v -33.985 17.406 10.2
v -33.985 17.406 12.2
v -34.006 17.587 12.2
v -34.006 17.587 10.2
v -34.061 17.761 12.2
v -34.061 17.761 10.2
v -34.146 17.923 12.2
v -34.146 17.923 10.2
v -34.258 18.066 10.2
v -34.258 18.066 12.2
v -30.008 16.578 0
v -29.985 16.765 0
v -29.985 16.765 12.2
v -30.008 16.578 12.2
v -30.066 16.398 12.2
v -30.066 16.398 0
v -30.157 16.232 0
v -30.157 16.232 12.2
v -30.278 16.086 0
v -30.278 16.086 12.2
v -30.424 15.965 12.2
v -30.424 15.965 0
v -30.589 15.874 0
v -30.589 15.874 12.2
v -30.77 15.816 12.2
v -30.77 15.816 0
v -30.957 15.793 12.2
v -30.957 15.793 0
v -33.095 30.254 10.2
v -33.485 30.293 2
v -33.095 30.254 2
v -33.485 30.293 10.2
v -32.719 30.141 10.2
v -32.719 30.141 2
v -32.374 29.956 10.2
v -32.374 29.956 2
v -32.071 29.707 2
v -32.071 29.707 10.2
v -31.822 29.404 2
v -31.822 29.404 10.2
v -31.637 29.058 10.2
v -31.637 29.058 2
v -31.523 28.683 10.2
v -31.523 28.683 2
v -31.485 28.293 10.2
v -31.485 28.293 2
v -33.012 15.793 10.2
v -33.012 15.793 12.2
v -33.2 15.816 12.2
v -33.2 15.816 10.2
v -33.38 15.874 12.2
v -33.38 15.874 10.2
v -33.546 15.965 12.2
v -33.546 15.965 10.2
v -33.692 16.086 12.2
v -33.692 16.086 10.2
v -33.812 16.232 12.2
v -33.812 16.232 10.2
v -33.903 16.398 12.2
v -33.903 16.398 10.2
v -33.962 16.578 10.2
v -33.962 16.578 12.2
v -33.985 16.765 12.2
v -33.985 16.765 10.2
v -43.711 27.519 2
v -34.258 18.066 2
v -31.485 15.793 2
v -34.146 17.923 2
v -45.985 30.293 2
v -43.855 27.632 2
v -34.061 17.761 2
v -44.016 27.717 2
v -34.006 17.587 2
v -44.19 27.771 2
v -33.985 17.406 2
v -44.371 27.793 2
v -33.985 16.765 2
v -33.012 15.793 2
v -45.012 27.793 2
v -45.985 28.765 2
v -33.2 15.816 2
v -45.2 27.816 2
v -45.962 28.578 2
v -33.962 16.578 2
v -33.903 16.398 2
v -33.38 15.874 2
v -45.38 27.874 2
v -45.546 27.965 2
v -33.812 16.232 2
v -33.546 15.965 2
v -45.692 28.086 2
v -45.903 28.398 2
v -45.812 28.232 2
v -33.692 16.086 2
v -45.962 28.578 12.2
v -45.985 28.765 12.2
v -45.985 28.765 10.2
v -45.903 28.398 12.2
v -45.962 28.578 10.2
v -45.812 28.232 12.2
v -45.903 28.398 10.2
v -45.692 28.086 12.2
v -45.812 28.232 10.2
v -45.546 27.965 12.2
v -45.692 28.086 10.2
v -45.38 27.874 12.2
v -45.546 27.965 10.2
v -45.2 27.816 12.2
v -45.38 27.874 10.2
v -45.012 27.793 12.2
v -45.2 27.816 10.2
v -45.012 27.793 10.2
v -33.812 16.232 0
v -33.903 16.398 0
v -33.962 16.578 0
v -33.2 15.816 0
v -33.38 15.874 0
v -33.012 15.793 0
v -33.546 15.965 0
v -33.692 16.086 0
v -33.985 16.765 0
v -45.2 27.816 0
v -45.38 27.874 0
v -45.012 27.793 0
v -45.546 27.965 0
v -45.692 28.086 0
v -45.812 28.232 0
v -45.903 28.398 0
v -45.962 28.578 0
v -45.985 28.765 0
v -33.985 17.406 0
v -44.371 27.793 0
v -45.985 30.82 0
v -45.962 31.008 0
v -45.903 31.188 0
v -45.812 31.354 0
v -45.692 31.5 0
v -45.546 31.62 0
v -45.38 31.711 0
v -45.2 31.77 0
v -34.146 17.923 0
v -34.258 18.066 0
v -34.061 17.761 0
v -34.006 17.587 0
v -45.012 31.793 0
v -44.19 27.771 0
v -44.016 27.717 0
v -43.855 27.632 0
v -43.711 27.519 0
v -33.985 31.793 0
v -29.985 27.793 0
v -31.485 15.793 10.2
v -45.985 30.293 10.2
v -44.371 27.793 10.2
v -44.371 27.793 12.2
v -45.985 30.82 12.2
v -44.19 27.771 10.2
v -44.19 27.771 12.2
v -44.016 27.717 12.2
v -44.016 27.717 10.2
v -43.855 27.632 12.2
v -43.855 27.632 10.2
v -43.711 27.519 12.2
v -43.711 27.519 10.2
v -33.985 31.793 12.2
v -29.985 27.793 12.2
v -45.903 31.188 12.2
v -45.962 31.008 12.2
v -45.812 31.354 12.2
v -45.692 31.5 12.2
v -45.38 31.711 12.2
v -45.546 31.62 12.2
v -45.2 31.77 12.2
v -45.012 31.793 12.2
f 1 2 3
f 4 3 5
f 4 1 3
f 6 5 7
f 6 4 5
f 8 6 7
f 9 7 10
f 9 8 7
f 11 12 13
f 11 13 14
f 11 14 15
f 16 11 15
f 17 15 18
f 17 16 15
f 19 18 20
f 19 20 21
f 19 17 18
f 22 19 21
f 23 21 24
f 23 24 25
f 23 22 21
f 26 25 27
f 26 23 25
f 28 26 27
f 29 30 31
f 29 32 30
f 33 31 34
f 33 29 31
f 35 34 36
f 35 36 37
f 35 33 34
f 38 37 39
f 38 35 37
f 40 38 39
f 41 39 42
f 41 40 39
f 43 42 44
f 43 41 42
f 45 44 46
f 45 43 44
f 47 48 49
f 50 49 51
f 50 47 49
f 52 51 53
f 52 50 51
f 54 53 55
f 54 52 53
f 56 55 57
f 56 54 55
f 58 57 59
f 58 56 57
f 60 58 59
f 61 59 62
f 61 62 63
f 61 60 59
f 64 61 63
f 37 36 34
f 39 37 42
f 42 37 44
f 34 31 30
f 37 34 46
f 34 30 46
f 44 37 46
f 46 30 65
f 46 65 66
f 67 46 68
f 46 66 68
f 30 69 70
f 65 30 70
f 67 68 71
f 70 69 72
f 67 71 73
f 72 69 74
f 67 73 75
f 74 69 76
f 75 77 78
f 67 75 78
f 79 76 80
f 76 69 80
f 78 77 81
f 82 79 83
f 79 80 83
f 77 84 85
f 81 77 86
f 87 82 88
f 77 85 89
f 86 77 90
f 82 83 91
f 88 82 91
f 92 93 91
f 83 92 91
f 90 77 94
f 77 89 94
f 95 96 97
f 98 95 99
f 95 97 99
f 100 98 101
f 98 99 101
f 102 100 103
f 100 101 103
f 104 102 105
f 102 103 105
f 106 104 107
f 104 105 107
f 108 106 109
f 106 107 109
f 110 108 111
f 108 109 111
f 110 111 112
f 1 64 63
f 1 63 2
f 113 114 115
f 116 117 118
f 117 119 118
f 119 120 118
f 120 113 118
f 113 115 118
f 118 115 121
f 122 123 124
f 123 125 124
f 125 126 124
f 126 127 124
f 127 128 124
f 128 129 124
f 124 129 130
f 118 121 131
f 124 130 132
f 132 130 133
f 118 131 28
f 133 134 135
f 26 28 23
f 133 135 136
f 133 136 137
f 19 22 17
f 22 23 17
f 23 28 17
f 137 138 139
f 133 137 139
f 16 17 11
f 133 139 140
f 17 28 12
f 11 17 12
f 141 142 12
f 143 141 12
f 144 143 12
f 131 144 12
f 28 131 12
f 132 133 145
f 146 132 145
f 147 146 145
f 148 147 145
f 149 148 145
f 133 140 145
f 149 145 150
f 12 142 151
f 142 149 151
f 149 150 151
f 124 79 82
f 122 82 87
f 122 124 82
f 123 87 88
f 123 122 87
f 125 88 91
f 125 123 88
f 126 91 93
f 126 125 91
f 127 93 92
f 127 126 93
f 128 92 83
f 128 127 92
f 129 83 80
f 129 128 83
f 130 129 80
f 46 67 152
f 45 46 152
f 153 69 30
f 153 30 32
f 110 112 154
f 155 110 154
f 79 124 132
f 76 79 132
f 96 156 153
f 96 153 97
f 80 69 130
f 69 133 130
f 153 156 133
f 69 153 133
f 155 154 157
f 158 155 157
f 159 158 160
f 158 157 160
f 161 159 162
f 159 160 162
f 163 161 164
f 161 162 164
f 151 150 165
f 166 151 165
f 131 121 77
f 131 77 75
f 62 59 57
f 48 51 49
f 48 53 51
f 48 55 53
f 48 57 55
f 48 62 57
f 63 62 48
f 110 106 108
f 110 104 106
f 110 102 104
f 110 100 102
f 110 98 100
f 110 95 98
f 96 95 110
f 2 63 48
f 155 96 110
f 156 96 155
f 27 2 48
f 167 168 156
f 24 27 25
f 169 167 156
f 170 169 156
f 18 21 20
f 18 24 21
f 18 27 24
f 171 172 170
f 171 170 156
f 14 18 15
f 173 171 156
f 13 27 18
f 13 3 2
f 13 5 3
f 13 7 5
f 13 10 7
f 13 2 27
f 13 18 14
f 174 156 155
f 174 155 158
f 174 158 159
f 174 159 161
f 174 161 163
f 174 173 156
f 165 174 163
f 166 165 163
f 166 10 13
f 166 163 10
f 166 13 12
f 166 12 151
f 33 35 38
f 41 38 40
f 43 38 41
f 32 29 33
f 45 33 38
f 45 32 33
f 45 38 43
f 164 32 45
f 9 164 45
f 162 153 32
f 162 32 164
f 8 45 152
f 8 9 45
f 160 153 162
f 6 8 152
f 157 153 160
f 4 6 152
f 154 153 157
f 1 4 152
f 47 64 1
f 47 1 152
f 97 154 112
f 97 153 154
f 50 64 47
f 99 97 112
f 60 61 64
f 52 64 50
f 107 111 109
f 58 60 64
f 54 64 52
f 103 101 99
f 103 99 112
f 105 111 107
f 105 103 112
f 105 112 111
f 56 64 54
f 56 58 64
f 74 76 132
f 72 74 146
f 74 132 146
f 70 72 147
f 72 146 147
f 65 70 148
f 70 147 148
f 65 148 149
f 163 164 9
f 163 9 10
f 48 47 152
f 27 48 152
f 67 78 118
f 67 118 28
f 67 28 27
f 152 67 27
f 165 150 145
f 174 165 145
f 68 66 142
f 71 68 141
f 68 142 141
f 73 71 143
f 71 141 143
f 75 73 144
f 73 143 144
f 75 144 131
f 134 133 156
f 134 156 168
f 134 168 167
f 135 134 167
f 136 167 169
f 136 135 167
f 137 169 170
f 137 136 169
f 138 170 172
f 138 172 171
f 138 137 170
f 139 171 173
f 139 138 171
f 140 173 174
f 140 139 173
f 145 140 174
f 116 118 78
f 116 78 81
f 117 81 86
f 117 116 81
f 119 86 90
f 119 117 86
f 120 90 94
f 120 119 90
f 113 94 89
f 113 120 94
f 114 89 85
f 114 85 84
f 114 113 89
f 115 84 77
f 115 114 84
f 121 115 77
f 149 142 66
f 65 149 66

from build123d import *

# Parameters (mm, degrees)
F0_W        = 4
F0_H        = 12
F1_DEPTH    = 12.2
F2_W        = 2.5
F2_H        = 8.2
F3_DEPTH    = 14.5
F4_W        = 2.5
F4_H        = 8.2
F5_DEPTH    = 13.2
F6_SIZE     = 10
F7_R        = 2
F8_SIZE     = 4
F9_T1_DEPTH = 2
F9_T3_DEPTH = 2
F9_T5_DEPTH = 7.0048288267
F9_T7_DEPTH = 17.2048288267
F9_T9_DEPTH = 7.0048288267


# Not quite as in the source:
# - a fillet or chamfer that OpenCascade refuses, or shapes differently, is made with other operations: its cross-section is extruded or revolved along the edge and cut away or added


with BuildPart() as f1:
    # F0 (on Top) → F1 (new body)
    with BuildSketch(Plane.XY):
        Polygon((-29.984754981, 31.7928069385), (-45.984754981, 31.7928069385), (-45.984754981, 27.7928069385), (-33.984754981, 27.7928069385), (-29.984754981, 27.7928069385), align=None)
        with Locations((-31.984754981, 21.7928069385)):
            Rectangle(F0_W, F0_H)
    extrude(amount=F1_DEPTH)

    # F2 (on face) → F3 (cut)
    with BuildSketch(Plane(origin=(-45.984754981, 0, 0), x_dir=(0, -1, 0), z_dir=(-1, 0, 0))):
        with Locations((-29.0428069385, 6.1)):
            Rectangle(F2_W, F2_H)
    extrude(amount=-F3_DEPTH, mode=Mode.SUBTRACT)

    # F4 (on face) → F5 (cut)
    with BuildSketch(Plane.XZ.offset(-15.7928069385)):
        with Locations((-32.734754981, 6.1)):
            Rectangle(F4_W, F4_H)
    extrude(amount=-F5_DEPTH, mode=Mode.SUBTRACT)

    # F6
    f6_edges = [f1.edges().sort_by_distance(p)[0] for p in [
        (-33.984755, 27.792807, 1),
        (-33.984755, 27.792807, 11.2),
    ]]
    chamfer(f6_edges, length=F6_SIZE)

    # F7
    f7_edges = [f1.edges().sort_by_distance(p)[0] for p in [
        (-31.484755, 30.292807, 6.1),
    ]]
    fillet(f7_edges, radius=F7_R)

    # F8
    f8_edges = [f1.edges().sort_by_distance(p)[0] for p in [
        (-29.984755, 31.792807, 6.1),
    ]]
    chamfer(f8_edges, length=F8_SIZE)

    # F9: fillet of radius 1 on 14 edges, made by hand

    # F9_s2 → F9_t1 (join)
    with BuildSketch(Plane.XY):
        with BuildLine():
            ThreePointArc((-44.3997969705, 27.7932069385), (-44.0161950979, 27.7169037819), (-43.690993133, 27.4996107759))
            Line((-43.690993133, 27.4996107759), (-43.6201127493, 27.5704911597))
            ThreePointArc((-43.6201127493, 27.5704911597), (-43.7671350946, 27.7169478196), (-43.9138745973, 27.8636873222))
            Line((-43.9138745973, 27.8636873222), (-43.984754981, 27.8930469385))
            ThreePointArc((-43.984754981, 27.8930469385), (-44.1922759758, 27.8930469385), (-44.3997969705, 27.8934469385))
            Line((-44.3997969705, 27.8934469385), (-44.3997969705, 27.7932069385))
        make_face()
        with BuildLine():
            ThreePointArc((-34.2779511435, 18.0865687864), (-34.0606581376, 17.7613668216), (-33.984354981, 17.377764949))
            Line((-33.984354981, 17.377764949), (-33.884114981, 17.377764949))
            ThreePointArc((-33.884114981, 17.377764949), (-33.884514981, 17.5852859437), (-33.884514981, 17.7928069385))
            Line((-33.884514981, 17.7928069385), (-33.9138745973, 17.8636873222))
            ThreePointArc((-33.9138745973, 17.8636873222), (-34.0606140999, 18.0104268249), (-34.2070707598, 18.1574491702))
            Line((-34.2070707598, 18.1574491702), (-34.2779511435, 18.0865687864))
        make_face()
    extrude(amount=F9_T1_DEPTH)

    # F9_s4 → F9_t3 (join)
    with BuildSketch(Plane.XY.offset(10.2)):
        with BuildLine():
            ThreePointArc((-44.3997969705, 27.7932069385), (-44.0161950979, 27.7169037819), (-43.690993133, 27.4996107759))
            Line((-43.690993133, 27.4996107759), (-43.6201127493, 27.5704911597))
            ThreePointArc((-43.6201127493, 27.5704911597), (-43.7671350946, 27.7169478196), (-43.9138745973, 27.8636873222))
            Line((-43.9138745973, 27.8636873222), (-43.984754981, 27.8930469385))
            ThreePointArc((-43.984754981, 27.8930469385), (-44.1922759758, 27.8930469385), (-44.3997969705, 27.8934469385))
            Line((-44.3997969705, 27.8934469385), (-44.3997969705, 27.7932069385))
        make_face()
        with BuildLine():
            ThreePointArc((-33.984354981, 17.377764949), (-34.0606581376, 17.7613668216), (-34.2779511435, 18.0865687864))
            Line((-34.2779511435, 18.0865687864), (-34.2070707598, 18.1574491702))
            ThreePointArc((-34.2070707598, 18.1574491702), (-34.0606140999, 18.0104268249), (-33.9138745973, 17.8636873222))
            Line((-33.9138745973, 17.8636873222), (-33.884514981, 17.7928069385))
            ThreePointArc((-33.884514981, 17.7928069385), (-33.884514981, 17.5852859437), (-33.884114981, 17.377764949))
            Line((-33.884114981, 17.377764949), (-33.984354981, 17.377764949))
        make_face()
    extrude(amount=F9_T3_DEPTH)

    # F9_s6 → F9_t5 (cut)
    with BuildSketch(Plane.XY.offset(7.6975855866)):
        with BuildLine():
            ThreePointArc((-45.985154981, 28.7937726239), (-45.6918617622, 28.0857001573), (-44.9837892956, 27.7924069385))
            Line((-44.9837892956, 27.7924069385), (-44.9837892956, 27.6922703699))
            ThreePointArc((-44.9837892956, 27.6922703699), (-45.4842721383, 27.6926703699), (-45.984754981, 27.6926703699))
            Line((-45.984754981, 27.6926703699), (-46.0848915495, 27.7928069385))
            ThreePointArc((-46.0848915495, 27.7928069385), (-46.0848915495, 28.2932897812), (-46.0852915495, 28.7937726239))
            Line((-46.0852915495, 28.7937726239), (-45.985154981, 28.7937726239))
        make_face()
        with BuildLine():
            ThreePointArc((-32.9837892956, 15.7924069385), (-33.6918617622, 16.0857001573), (-33.985154981, 16.7937726239))
            Line((-33.985154981, 16.7937726239), (-34.0852915495, 16.7937726239))
            ThreePointArc((-34.0852915495, 16.7937726239), (-34.0848915495, 16.2932897812), (-34.0848915495, 15.7928069385))
            Line((-34.0848915495, 15.7928069385), (-33.984754981, 15.6926703699))
            ThreePointArc((-33.984754981, 15.6926703699), (-33.4842721383, 15.6926703699), (-32.9837892956, 15.6922703699))
            Line((-32.9837892956, 15.6922703699), (-32.9837892956, 15.7924069385))
        make_face()
    extrude(amount=F9_T5_DEPTH, mode=Mode.SUBTRACT)

    # F9_s8 → F9_t7 (cut)
    with BuildSketch(Plane.XY.offset(-2.5024144134)):
        with BuildLine():
            ThreePointArc((-29.984354981, 16.7937726239), (-30.2776481998, 16.0857001573), (-30.9857206664, 15.7924069385))
            Line((-30.9857206664, 15.7924069385), (-30.9857206664, 15.6922703699))
            ThreePointArc((-30.9857206664, 15.6922703699), (-30.4852378237, 15.6926703699), (-29.984754981, 15.6926703699))
            Line((-29.984754981, 15.6926703699), (-29.8846184125, 15.7928069385))
            ThreePointArc((-29.8846184125, 15.7928069385), (-29.8846184125, 16.2932897812), (-29.8842184125, 16.7937726239))
            Line((-29.8842184125, 16.7937726239), (-29.984354981, 16.7937726239))
        make_face()
        with BuildLine():
            ThreePointArc((-45.985154981, 30.7918412531), (-45.6918617622, 31.4999137197), (-44.9837892956, 31.7932069385))
            Line((-44.9837892956, 31.7932069385), (-44.9837892956, 31.893343507))
            ThreePointArc((-44.9837892956, 31.893343507), (-45.4842721383, 31.892943507), (-45.984754981, 31.892943507))
            Line((-45.984754981, 31.892943507), (-46.0848915495, 31.7928069385))
            ThreePointArc((-46.0848915495, 31.7928069385), (-46.0848915495, 31.2923240958), (-46.0852915495, 30.7918412531))
            Line((-46.0852915495, 30.7918412531), (-45.985154981, 30.7918412531))
        make_face()
    extrude(amount=F9_T7_DEPTH, mode=Mode.SUBTRACT)

    # F9_s10 → F9_t9 (cut)
    with BuildSketch(Plane.XY.offset(-2.5024144134)):
        with BuildLine():
            ThreePointArc((-32.9837892956, 15.7924069385), (-33.6918617622, 16.0857001573), (-33.985154981, 16.7937726239))
            Line((-33.985154981, 16.7937726239), (-34.0852915495, 16.7937726239))
            ThreePointArc((-34.0852915495, 16.7937726239), (-34.0848915495, 16.2932897812), (-34.0848915495, 15.7928069385))
            Line((-34.0848915495, 15.7928069385), (-33.984754981, 15.6926703699))
            ThreePointArc((-33.984754981, 15.6926703699), (-33.4842721383, 15.6926703699), (-32.9837892956, 15.6922703699))
            Line((-32.9837892956, 15.6922703699), (-32.9837892956, 15.7924069385))
        make_face()
        with BuildLine():
            ThreePointArc((-44.9837892956, 27.7924069385), (-45.6918617622, 28.0857001573), (-45.985154981, 28.7937726239))
            Line((-45.985154981, 28.7937726239), (-46.0852915495, 28.7937726239))
            ThreePointArc((-46.0852915495, 28.7937726239), (-46.0848915495, 28.2932897812), (-46.0848915495, 27.7928069385))
            Line((-46.0848915495, 27.7928069385), (-45.984754981, 27.6926703699))
            ThreePointArc((-45.984754981, 27.6926703699), (-45.4842721383, 27.6926703699), (-44.9837892956, 27.6922703699))
            Line((-44.9837892956, 27.6922703699), (-44.9837892956, 27.7924069385))
        make_face()
    extrude(amount=F9_T9_DEPTH, mode=Mode.SUBTRACT)


solid = f1.part
